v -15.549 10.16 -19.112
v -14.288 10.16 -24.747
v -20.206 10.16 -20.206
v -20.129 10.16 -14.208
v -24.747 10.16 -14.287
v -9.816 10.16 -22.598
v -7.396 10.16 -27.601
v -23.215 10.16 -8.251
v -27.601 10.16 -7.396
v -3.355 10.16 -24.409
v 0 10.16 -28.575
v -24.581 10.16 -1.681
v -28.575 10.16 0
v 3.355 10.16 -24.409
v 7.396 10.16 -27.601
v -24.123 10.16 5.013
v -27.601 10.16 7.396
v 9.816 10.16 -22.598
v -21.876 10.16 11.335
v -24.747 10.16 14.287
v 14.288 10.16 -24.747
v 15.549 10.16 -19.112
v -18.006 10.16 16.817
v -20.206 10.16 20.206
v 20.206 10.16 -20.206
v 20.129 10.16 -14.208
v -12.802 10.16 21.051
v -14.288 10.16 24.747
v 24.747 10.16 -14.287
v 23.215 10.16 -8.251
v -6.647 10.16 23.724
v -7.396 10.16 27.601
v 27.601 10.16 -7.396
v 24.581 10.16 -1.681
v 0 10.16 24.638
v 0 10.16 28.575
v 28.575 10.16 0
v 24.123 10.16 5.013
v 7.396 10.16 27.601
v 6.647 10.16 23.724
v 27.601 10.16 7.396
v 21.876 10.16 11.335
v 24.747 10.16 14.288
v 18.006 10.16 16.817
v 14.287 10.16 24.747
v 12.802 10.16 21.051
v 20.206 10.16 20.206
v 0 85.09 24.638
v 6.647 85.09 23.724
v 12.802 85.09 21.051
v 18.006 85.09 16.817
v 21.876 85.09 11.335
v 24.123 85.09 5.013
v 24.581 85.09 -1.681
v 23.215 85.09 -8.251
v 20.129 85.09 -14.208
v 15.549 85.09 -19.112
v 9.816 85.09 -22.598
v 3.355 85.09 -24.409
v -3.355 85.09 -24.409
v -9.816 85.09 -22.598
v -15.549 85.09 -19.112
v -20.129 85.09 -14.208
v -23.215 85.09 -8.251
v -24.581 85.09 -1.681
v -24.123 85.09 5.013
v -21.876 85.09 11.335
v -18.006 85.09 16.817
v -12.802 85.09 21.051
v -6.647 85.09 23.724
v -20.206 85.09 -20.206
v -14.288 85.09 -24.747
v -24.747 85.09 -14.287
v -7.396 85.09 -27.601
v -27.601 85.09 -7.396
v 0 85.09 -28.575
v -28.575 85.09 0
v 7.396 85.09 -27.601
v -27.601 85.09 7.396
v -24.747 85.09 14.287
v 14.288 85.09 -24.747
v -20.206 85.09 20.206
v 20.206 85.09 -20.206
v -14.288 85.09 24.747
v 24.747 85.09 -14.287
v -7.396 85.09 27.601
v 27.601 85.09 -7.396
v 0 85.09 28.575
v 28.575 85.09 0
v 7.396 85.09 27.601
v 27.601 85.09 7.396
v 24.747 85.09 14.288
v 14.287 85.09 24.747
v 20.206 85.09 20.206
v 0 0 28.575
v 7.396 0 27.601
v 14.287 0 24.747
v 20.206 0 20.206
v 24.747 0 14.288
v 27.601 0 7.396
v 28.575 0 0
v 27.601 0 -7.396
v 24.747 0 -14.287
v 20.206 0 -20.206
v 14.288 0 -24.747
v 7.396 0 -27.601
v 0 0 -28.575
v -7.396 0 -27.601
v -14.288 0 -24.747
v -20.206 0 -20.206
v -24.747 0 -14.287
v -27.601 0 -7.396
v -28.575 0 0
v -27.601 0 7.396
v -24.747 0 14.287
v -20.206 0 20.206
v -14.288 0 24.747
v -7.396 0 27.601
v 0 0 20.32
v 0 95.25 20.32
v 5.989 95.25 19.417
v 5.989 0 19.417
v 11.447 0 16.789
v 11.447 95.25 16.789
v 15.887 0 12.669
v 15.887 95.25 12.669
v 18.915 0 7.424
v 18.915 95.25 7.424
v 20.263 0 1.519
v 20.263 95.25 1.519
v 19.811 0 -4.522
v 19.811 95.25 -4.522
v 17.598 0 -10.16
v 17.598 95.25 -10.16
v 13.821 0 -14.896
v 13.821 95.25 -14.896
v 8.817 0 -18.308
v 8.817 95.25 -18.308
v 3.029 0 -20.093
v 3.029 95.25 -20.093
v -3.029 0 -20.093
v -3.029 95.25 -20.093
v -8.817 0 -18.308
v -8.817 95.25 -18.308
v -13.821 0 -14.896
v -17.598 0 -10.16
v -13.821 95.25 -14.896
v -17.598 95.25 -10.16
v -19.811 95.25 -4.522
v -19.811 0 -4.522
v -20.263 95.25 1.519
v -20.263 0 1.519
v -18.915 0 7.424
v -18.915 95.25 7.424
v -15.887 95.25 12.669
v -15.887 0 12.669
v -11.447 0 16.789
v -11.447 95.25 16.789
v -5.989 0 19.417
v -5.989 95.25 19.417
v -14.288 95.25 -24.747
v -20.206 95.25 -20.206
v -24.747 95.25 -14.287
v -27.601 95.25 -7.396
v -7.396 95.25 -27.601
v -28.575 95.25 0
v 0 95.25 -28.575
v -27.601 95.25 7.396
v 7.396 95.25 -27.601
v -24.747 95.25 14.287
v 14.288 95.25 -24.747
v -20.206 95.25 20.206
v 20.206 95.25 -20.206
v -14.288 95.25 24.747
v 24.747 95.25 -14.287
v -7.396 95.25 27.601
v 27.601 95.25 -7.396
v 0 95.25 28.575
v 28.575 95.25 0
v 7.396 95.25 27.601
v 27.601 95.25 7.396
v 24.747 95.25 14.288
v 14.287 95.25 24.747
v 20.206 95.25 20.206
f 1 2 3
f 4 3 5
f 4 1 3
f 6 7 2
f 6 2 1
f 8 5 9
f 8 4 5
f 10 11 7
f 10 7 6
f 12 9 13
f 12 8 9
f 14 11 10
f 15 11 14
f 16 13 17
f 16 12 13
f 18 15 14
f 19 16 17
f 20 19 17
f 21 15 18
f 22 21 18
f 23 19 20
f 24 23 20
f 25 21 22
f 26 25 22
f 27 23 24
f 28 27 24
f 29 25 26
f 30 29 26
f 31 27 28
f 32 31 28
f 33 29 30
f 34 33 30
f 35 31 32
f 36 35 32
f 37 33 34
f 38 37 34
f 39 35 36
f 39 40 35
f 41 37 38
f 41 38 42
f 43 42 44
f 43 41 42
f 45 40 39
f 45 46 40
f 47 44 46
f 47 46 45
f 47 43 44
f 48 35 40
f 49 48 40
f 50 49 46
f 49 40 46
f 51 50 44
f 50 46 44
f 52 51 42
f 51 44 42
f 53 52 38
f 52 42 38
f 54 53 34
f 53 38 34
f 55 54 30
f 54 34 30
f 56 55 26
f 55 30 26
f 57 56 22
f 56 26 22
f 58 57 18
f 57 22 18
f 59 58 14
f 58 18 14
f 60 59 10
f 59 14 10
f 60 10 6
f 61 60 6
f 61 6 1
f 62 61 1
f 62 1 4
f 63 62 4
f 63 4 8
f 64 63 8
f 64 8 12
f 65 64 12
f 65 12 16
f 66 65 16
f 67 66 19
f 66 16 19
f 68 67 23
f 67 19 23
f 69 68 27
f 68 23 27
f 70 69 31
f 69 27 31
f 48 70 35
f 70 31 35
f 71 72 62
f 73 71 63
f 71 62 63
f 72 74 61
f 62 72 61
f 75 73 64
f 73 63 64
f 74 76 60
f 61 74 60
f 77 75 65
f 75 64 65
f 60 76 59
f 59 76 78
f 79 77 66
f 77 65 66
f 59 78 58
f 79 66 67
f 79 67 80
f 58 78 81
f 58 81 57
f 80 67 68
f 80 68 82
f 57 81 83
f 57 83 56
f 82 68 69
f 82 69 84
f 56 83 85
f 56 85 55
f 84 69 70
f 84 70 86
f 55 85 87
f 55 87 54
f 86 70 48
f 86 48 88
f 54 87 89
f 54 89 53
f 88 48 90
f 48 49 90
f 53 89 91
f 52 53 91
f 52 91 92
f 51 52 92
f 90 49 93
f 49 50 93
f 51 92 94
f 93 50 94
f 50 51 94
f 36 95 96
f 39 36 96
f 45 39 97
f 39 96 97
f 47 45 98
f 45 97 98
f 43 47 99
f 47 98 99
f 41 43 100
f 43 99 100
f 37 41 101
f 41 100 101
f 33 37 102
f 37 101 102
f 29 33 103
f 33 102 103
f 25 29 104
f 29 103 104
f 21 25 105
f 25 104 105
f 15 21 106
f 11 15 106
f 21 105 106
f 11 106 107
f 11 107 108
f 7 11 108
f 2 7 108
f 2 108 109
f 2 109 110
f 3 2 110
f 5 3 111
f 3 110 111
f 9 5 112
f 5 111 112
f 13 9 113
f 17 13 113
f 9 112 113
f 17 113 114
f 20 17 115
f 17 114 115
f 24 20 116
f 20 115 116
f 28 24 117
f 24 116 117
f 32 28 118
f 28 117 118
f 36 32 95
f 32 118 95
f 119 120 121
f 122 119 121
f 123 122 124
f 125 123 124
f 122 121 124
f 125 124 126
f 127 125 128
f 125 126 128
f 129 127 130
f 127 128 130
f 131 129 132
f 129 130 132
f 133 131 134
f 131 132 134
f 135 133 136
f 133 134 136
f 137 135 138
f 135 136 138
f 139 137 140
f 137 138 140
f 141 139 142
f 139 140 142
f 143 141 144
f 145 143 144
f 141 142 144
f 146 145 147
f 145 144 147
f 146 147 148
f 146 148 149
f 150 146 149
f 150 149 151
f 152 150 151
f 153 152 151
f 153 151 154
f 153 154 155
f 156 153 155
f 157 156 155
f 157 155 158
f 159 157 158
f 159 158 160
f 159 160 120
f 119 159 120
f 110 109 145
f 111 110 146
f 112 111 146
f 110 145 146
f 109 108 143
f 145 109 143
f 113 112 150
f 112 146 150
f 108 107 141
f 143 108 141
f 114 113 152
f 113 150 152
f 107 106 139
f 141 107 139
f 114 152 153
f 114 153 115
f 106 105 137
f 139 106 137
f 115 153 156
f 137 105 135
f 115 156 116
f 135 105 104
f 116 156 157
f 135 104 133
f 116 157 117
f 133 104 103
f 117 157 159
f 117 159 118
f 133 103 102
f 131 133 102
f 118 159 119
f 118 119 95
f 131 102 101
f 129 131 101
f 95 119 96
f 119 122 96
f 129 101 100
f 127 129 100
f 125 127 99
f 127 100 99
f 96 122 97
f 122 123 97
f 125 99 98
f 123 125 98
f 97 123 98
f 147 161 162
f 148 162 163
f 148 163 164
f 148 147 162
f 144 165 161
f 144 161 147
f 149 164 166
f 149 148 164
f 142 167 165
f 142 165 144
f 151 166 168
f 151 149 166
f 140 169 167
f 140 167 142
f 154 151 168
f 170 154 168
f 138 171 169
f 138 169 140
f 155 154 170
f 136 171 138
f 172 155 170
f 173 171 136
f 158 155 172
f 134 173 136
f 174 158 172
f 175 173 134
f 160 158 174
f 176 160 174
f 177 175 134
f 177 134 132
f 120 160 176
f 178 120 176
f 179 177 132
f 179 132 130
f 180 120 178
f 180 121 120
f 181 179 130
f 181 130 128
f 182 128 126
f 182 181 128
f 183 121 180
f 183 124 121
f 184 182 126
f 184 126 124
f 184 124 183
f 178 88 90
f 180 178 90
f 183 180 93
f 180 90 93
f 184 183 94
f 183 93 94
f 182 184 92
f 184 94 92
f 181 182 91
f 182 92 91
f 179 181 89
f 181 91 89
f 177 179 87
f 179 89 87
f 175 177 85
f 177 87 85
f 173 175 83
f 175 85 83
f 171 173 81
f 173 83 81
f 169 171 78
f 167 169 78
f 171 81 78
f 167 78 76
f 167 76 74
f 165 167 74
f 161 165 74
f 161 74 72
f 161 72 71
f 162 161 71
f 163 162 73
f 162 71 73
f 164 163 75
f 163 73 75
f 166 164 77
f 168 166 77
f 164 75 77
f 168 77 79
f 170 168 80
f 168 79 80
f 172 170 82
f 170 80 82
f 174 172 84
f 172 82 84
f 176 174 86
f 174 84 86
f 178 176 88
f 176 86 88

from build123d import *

# Parameters (mm, degrees)
SKETCH3_R           = 28.575
BOSS_EXTRUDE2_DEPTH = 10.16
SKETCH4_R           = 24.638
BOSS_EXTRUDE3_DEPTH = 85.09
BOSS_EXTRUDE4_START = -10.16
SKETCH5_R           = 28.575
BOSS_EXTRUDE4_DEPTH = 10.16
SKETCH6_R           = 20.32
CUT_EXTRUDE1_DEPTH  = 104.14


with BuildPart() as part:
    # Sketch3 → Boss-Extrude2 (new body)
    with BuildSketch(Plane(origin=(0, 0, 0), x_dir=(1, 0, 0), z_dir=(0, 1, 0))):
        with Locations(Location((0, 0, 0), (0, 0, 270))):
            Circle(SKETCH3_R)
    extrude(amount=BOSS_EXTRUDE2_DEPTH)

    # Sketch4 → Boss-Extrude3 (add)
    with BuildSketch(Plane(origin=(0, 10.16, 0), x_dir=(1, 0, 0), z_dir=(0, 1, 0))):
        with Locations(Location((0, 0, 0), (0, 0, 270))):
            Circle(SKETCH4_R)
    extrude(amount=BOSS_EXTRUDE3_DEPTH)

    # Sketch5 → Boss-Extrude4 (add)
    with BuildSketch(Plane(origin=(0, 95.25, 0), x_dir=(1, 0, 0), z_dir=(0, 1, 0)).offset(BOSS_EXTRUDE4_START)):
        with Locations(Location((0, 0, 0), (0, 0, 270))):
            Circle(SKETCH5_R)
    extrude(amount=BOSS_EXTRUDE4_DEPTH)

    # Sketch6 → Cut-Extrude1 (cut)
    with BuildSketch(Plane(origin=(0, 95.25, 0), x_dir=(1, 0, 0), z_dir=(0, 1, 0))):
        with Locations(Location((0, 0, 0), (0, 0, 270))):
            Circle(SKETCH6_R)
    extrude(amount=-CUT_EXTRUDE1_DEPTH, mode=Mode.SUBTRACT)


solid = part.part
